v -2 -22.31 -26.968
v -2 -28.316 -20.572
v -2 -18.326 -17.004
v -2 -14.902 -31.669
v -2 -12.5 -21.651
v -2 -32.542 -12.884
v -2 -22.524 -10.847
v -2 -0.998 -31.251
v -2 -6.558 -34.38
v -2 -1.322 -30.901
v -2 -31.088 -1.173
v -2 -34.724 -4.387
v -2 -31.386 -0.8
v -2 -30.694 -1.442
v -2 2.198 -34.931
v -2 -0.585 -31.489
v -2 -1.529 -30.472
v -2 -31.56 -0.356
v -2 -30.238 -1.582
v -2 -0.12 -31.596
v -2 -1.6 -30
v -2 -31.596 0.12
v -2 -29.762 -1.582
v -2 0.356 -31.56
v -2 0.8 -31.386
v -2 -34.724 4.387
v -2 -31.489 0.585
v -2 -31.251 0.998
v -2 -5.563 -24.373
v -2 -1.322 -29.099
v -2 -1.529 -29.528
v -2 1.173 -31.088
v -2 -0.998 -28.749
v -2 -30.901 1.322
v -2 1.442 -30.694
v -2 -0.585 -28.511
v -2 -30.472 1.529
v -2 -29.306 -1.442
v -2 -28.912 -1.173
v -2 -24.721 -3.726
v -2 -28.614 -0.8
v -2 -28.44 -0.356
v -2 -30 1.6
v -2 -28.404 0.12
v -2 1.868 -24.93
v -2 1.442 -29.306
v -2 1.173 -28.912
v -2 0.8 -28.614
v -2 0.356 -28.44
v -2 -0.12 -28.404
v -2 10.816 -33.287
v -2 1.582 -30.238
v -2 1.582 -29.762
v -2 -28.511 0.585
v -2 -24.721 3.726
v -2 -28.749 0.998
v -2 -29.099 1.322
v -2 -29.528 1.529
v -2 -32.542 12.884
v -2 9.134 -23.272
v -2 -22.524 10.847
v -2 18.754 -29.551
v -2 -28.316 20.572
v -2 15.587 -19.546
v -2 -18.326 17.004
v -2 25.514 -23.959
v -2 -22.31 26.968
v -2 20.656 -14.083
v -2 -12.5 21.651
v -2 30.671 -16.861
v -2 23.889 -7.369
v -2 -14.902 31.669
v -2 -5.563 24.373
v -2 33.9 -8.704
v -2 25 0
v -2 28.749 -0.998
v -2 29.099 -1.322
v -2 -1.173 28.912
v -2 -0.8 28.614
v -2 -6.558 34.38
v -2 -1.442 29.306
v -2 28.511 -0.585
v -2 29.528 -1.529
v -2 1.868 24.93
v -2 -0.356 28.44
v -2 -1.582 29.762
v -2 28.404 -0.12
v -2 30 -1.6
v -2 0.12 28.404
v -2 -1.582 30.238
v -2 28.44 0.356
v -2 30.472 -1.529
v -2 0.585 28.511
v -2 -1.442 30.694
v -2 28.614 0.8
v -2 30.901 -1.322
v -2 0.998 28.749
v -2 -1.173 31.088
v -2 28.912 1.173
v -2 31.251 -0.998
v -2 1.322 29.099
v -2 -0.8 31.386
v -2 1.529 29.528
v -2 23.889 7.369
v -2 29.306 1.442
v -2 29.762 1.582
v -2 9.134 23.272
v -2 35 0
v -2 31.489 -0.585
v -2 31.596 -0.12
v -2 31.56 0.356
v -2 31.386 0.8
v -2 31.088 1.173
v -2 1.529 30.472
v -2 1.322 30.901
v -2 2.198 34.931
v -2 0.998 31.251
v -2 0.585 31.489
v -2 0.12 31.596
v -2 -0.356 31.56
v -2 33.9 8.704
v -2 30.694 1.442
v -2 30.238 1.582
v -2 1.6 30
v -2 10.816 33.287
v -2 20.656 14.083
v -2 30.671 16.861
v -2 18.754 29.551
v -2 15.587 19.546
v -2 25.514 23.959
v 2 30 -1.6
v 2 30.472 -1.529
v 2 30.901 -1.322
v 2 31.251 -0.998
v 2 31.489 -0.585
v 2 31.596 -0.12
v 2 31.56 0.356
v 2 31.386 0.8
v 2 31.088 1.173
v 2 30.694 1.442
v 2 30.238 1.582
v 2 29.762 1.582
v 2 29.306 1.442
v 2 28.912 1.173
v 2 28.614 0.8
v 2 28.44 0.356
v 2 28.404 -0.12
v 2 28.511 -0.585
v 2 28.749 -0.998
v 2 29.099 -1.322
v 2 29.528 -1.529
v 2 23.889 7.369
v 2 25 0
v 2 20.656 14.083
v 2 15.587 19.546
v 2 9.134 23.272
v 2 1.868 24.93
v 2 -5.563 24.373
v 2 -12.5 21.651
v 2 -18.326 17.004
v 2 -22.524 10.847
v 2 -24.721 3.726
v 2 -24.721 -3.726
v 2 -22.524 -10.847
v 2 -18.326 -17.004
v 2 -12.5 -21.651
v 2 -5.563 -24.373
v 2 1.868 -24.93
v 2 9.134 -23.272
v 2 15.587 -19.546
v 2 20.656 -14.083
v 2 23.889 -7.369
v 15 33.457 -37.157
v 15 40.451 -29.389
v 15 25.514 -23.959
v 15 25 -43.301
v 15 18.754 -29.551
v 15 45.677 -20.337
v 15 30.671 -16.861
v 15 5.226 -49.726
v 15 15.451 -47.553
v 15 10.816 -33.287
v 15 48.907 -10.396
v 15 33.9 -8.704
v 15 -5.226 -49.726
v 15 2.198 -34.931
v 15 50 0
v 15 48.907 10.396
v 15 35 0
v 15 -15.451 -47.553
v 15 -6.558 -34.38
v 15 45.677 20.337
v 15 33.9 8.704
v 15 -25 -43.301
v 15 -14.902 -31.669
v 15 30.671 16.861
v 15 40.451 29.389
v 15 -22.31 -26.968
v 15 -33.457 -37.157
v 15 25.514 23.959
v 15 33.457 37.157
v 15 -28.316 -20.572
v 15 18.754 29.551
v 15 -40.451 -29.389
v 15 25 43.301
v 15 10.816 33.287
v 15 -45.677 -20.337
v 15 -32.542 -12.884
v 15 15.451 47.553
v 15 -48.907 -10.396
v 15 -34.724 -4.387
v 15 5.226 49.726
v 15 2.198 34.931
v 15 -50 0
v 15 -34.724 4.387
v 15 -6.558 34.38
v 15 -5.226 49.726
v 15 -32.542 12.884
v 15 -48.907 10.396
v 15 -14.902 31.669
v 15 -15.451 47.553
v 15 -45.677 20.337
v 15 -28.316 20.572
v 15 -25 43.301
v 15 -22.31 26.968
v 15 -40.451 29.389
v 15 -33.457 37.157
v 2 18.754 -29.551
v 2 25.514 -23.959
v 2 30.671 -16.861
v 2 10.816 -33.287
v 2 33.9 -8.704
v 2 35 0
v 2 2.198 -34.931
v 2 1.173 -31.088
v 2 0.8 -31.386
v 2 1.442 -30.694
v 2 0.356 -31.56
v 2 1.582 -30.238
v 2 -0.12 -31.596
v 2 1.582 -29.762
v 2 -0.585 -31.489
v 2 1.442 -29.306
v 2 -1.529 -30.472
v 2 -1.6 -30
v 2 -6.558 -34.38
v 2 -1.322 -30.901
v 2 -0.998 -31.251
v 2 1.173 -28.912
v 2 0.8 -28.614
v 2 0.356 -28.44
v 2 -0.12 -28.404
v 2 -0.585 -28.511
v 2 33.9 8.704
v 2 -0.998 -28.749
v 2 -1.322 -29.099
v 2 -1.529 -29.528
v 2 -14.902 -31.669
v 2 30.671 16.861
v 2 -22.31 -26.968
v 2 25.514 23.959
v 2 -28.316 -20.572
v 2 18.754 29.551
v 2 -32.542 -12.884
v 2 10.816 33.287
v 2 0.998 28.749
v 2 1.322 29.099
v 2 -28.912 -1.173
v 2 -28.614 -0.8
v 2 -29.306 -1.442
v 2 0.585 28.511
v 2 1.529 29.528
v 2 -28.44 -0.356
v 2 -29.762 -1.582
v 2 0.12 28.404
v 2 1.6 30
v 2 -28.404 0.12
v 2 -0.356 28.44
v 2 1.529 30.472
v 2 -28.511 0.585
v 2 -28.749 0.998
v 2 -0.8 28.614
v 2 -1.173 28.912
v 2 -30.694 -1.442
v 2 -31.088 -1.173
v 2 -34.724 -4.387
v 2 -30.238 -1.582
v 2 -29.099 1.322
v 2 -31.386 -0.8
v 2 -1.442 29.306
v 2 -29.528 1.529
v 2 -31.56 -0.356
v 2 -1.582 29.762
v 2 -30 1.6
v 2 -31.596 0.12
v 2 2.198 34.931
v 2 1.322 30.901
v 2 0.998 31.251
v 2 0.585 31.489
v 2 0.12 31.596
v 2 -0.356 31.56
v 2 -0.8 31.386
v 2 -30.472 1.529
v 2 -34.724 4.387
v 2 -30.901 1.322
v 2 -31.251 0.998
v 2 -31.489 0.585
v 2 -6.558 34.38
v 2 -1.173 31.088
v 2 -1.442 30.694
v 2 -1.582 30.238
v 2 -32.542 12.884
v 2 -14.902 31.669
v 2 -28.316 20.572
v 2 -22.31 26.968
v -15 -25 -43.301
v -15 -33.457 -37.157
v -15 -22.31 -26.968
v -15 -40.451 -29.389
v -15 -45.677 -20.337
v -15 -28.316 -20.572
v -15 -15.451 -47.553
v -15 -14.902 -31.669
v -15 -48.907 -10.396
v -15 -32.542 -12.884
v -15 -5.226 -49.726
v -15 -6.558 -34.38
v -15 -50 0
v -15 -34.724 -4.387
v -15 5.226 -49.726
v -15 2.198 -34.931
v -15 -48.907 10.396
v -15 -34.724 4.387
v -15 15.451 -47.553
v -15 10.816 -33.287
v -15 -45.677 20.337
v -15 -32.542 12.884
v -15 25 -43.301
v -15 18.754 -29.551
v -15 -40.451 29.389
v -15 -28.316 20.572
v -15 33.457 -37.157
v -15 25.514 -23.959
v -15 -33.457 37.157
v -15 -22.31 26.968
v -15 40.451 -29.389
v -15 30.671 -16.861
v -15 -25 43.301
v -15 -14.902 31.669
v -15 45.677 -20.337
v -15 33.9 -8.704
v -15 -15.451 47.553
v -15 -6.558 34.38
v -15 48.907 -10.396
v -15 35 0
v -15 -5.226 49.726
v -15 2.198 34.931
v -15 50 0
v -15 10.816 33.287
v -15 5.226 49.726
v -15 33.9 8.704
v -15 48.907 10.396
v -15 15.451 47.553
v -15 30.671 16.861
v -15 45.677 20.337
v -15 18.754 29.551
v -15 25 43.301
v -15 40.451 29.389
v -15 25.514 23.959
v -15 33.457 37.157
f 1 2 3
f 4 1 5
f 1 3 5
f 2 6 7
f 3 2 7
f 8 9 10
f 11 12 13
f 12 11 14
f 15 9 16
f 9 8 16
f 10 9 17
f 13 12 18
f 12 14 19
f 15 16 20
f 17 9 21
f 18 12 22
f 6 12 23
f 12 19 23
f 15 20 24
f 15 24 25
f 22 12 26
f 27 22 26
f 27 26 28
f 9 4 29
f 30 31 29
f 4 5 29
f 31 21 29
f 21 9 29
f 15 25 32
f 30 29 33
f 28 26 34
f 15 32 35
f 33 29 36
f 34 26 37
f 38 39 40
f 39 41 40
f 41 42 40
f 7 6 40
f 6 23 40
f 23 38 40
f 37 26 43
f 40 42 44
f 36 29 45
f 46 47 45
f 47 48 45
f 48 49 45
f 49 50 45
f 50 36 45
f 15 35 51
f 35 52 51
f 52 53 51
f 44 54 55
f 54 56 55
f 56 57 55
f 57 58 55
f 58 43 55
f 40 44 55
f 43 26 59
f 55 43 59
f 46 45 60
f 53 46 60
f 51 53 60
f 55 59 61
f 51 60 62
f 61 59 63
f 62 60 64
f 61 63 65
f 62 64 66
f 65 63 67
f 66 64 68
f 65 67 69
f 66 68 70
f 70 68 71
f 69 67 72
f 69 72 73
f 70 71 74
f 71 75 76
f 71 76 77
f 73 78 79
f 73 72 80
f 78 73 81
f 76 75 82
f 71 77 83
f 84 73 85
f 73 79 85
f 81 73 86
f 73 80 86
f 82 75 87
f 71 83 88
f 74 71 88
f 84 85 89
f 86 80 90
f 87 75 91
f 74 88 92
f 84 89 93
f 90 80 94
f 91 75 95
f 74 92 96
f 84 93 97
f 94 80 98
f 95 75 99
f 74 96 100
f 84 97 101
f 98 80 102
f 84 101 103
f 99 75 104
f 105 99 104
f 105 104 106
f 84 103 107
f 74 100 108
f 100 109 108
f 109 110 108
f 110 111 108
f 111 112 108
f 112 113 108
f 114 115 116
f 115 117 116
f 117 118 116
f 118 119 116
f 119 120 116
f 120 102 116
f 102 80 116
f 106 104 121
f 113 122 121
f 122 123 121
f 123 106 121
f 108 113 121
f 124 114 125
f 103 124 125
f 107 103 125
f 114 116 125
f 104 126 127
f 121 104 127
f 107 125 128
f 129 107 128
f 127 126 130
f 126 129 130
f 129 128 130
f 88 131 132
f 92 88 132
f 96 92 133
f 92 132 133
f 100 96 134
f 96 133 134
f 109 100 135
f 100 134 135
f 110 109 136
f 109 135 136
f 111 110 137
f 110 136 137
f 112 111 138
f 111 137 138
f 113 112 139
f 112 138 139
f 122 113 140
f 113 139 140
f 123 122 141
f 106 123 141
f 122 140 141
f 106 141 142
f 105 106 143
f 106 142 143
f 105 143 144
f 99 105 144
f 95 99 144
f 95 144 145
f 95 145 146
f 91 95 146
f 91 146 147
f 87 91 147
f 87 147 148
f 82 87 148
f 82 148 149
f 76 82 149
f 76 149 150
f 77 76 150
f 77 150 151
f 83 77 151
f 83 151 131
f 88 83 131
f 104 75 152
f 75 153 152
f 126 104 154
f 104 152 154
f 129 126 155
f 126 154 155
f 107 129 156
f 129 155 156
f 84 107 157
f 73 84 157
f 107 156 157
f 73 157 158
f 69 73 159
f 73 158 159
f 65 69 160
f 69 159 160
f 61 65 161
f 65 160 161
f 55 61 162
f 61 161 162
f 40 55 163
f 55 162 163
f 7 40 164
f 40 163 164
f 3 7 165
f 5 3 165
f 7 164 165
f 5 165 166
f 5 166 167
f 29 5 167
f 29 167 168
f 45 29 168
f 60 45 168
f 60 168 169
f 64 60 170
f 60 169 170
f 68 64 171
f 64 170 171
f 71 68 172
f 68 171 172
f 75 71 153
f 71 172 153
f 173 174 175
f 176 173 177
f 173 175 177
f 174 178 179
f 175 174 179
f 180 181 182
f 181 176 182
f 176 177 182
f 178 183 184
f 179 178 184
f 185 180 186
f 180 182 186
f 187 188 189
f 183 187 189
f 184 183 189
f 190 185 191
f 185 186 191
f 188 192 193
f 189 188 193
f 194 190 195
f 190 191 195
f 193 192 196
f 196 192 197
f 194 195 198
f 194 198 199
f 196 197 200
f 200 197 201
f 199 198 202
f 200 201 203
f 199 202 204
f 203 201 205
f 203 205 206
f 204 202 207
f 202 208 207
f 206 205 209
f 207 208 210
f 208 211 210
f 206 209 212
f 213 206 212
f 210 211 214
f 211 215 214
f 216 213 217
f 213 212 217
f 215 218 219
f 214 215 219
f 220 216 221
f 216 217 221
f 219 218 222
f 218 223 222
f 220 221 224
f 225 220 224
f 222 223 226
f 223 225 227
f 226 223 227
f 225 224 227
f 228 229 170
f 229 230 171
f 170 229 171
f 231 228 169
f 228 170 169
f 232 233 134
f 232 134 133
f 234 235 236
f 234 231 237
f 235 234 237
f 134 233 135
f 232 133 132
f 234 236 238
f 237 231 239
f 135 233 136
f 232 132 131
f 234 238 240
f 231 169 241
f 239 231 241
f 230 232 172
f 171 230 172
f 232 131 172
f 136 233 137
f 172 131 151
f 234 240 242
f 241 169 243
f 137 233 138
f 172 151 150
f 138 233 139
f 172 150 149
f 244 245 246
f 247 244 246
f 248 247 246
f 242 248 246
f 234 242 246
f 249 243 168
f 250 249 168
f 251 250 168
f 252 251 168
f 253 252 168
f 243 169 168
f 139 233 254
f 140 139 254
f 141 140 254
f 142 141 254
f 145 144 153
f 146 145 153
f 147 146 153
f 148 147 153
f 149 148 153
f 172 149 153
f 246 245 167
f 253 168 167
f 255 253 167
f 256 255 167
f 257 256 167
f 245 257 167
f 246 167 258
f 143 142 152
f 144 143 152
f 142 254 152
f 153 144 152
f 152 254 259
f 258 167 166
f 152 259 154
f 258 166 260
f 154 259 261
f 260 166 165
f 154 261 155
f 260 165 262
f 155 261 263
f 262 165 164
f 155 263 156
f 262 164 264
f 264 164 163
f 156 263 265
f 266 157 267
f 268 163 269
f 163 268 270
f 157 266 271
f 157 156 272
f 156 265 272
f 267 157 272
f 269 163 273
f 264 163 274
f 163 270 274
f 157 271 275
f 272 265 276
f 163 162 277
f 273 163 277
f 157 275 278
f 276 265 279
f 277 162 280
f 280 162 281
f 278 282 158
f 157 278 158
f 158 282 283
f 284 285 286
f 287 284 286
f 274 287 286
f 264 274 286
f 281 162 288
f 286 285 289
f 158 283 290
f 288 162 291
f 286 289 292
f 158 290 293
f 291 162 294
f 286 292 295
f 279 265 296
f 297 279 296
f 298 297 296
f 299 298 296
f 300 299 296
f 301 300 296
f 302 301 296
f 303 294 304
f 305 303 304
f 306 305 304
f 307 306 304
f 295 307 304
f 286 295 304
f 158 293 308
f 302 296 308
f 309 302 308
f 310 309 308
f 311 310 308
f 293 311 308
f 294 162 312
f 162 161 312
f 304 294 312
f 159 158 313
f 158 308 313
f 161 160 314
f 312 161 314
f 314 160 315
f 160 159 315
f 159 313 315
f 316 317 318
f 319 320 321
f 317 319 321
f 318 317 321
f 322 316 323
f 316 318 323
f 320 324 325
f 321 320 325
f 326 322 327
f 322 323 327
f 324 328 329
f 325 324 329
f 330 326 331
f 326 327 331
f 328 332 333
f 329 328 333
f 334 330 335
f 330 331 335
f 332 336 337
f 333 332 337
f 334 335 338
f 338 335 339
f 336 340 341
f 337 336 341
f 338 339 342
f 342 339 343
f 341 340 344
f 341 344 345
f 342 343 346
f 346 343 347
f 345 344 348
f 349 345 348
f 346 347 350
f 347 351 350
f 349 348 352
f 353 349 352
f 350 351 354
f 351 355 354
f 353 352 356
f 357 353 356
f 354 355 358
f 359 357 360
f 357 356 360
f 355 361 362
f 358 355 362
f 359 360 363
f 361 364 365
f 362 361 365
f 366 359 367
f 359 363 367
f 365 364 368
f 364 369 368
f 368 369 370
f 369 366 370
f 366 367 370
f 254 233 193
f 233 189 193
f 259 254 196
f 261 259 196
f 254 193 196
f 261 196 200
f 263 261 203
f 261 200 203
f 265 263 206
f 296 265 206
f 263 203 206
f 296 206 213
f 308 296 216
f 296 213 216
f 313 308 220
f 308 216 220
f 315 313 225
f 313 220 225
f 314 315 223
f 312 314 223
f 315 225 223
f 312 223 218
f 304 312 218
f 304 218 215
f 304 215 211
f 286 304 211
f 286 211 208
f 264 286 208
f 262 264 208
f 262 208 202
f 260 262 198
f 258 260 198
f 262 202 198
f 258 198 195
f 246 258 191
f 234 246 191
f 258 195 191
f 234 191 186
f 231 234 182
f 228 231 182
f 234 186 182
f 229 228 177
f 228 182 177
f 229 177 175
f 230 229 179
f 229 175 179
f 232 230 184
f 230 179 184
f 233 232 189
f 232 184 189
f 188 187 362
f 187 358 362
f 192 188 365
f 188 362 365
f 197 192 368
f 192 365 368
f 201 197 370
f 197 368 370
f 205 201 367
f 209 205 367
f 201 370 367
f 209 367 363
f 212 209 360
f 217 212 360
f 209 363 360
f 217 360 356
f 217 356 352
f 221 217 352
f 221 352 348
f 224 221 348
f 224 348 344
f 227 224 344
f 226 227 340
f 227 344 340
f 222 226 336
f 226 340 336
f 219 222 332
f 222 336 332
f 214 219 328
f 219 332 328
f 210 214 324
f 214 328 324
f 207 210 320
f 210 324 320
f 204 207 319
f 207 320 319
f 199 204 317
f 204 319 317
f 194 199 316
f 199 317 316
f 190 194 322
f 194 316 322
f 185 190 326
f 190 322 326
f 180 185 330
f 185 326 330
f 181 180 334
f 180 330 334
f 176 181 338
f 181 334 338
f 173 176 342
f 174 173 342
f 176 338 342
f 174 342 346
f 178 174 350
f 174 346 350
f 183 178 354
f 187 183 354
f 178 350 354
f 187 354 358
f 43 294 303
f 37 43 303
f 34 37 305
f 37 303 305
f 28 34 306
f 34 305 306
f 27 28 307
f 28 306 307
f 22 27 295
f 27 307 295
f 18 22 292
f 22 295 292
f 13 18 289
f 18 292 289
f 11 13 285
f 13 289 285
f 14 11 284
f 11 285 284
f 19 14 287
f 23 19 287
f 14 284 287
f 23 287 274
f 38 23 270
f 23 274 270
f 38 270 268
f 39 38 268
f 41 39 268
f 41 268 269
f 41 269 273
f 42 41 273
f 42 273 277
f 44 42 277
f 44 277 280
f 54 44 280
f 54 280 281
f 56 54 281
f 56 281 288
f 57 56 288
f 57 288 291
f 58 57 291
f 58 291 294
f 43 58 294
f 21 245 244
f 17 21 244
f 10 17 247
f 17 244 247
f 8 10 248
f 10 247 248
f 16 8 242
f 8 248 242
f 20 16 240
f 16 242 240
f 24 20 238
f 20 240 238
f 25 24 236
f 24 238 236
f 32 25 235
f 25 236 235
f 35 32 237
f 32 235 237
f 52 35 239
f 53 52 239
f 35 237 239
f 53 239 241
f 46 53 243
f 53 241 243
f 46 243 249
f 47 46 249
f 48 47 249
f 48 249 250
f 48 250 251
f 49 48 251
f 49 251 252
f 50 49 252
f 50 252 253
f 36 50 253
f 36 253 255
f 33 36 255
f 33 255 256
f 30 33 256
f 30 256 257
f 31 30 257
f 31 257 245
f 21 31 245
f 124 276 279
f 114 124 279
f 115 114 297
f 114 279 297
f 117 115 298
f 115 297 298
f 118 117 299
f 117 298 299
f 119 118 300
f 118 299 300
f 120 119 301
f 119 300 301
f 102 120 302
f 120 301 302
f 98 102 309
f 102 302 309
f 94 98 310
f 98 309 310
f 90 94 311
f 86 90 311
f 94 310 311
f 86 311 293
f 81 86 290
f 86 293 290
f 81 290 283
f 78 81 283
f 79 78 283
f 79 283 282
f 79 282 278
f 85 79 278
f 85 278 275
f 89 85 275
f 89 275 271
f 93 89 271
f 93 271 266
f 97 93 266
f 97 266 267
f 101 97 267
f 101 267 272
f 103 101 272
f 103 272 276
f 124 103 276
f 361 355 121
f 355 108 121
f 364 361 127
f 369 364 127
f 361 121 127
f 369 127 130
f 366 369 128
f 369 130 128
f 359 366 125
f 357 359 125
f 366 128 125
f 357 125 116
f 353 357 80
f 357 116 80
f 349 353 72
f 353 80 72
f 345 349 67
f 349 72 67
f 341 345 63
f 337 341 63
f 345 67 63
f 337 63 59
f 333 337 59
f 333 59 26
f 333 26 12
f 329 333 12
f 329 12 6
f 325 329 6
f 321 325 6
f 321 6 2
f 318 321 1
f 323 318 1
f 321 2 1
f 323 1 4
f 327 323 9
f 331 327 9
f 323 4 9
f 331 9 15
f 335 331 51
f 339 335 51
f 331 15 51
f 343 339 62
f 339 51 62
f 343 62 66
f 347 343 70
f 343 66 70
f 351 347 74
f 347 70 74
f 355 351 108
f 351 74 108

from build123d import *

# Parameters (mm, degrees)
SKETCH3_R          = 1.6
CUT_EXTRUDE1_DEPTH = 18
CIRPATTERN1_COUNT  = 4


with BuildPart() as part:
    # Sketch2 → Revolve1 (revolve)
    with BuildSketch(Plane.XY):
        Polygon((15, 50), (-15, 50), (-15, 35), (-2, 35), (-2, 25), (2, 25), (2, 35), (15, 35), align=None)
    revolve(axis=Axis((0, 0, 0), (1, 0, 0)))

    # Sketch3 → Cut-Extrude1 (cut, through all)
    with BuildSketch(Plane(origin=(2, 0, 0), x_dir=(0, 0, -1), z_dir=(1, 0, 0))):
        with Locations((0, 30)):
            Circle(SKETCH3_R)
    cut_extrude1 = extrude(amount=-CUT_EXTRUDE1_DEPTH, mode=Mode.SUBTRACT)

    # CirPattern1: Cut-Extrude1 ×4 about axis
    cirpattern1_axis = Axis((0, 0, 0), (1, 0, 0))
    for i in range(1, CIRPATTERN1_COUNT):
        add(cut_extrude1.rotate(cirpattern1_axis, i * 360 / CIRPATTERN1_COUNT), mode=Mode.SUBTRACT)


solid = part.part
